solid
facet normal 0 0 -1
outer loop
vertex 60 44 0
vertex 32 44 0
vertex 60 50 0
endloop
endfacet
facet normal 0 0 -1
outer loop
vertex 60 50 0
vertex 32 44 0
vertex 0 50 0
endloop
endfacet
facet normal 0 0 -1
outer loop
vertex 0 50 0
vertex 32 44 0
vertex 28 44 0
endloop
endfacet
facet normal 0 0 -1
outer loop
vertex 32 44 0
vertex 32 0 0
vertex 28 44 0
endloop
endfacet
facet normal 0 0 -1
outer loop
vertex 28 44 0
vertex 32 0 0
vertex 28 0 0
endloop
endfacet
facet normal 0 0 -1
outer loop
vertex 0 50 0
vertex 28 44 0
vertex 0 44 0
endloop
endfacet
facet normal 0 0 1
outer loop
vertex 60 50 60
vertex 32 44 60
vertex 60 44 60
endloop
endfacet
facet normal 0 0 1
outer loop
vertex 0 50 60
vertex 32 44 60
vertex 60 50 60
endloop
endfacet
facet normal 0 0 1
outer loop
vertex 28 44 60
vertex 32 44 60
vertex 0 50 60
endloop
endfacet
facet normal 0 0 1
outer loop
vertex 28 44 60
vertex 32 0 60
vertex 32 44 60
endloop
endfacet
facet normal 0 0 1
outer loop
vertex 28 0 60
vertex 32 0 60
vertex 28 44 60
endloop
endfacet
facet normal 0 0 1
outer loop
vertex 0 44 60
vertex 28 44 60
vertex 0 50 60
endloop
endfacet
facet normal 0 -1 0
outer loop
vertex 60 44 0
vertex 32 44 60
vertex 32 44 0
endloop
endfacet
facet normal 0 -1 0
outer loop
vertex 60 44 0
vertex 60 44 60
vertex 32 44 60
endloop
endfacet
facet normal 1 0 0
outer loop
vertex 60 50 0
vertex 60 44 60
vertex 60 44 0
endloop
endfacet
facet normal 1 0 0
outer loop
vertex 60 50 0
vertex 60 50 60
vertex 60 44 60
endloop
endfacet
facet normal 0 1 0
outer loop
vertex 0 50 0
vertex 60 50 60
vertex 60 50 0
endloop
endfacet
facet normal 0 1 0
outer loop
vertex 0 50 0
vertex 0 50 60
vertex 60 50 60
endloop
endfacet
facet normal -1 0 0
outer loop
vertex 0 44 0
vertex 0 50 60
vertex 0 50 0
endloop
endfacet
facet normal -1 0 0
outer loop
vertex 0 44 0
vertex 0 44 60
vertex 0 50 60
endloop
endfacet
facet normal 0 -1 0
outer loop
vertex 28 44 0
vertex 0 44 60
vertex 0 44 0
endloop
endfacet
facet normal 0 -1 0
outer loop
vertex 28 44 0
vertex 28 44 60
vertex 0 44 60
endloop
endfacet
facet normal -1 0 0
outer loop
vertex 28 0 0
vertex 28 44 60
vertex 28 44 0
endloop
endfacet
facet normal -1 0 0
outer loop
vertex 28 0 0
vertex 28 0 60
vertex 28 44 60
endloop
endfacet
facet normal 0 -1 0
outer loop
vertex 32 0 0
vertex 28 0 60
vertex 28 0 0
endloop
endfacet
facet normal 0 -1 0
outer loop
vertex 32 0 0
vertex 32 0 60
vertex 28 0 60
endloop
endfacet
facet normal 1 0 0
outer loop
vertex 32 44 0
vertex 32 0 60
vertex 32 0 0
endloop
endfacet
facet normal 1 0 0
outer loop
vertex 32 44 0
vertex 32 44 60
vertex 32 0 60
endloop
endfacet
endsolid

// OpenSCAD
$fn = 32;

// ----------------------------------------------------------------------
// Structural section: tee 60 x 50 mm
// ----------------------------------------------------------------------

// --- parameters (mm) ---
sec_w = 60;               // tee width, X
sec_h = 50;               // tee height, Y
flange_t = 6;             // top flange thickness
web_t = 4;                // web thickness
plate_t = 60;             // cut length, Z (extrusion height)

profile = [[28, 0], [32, 0], [32, 44], [60, 44], [60, 50], [0, 50], [0, 44], [28, 44]];  // primary outline, 8 points, counter clockwise

// --- the one profile operation ---
linear_extrude(height = plate_t) polygon(points = profile);
